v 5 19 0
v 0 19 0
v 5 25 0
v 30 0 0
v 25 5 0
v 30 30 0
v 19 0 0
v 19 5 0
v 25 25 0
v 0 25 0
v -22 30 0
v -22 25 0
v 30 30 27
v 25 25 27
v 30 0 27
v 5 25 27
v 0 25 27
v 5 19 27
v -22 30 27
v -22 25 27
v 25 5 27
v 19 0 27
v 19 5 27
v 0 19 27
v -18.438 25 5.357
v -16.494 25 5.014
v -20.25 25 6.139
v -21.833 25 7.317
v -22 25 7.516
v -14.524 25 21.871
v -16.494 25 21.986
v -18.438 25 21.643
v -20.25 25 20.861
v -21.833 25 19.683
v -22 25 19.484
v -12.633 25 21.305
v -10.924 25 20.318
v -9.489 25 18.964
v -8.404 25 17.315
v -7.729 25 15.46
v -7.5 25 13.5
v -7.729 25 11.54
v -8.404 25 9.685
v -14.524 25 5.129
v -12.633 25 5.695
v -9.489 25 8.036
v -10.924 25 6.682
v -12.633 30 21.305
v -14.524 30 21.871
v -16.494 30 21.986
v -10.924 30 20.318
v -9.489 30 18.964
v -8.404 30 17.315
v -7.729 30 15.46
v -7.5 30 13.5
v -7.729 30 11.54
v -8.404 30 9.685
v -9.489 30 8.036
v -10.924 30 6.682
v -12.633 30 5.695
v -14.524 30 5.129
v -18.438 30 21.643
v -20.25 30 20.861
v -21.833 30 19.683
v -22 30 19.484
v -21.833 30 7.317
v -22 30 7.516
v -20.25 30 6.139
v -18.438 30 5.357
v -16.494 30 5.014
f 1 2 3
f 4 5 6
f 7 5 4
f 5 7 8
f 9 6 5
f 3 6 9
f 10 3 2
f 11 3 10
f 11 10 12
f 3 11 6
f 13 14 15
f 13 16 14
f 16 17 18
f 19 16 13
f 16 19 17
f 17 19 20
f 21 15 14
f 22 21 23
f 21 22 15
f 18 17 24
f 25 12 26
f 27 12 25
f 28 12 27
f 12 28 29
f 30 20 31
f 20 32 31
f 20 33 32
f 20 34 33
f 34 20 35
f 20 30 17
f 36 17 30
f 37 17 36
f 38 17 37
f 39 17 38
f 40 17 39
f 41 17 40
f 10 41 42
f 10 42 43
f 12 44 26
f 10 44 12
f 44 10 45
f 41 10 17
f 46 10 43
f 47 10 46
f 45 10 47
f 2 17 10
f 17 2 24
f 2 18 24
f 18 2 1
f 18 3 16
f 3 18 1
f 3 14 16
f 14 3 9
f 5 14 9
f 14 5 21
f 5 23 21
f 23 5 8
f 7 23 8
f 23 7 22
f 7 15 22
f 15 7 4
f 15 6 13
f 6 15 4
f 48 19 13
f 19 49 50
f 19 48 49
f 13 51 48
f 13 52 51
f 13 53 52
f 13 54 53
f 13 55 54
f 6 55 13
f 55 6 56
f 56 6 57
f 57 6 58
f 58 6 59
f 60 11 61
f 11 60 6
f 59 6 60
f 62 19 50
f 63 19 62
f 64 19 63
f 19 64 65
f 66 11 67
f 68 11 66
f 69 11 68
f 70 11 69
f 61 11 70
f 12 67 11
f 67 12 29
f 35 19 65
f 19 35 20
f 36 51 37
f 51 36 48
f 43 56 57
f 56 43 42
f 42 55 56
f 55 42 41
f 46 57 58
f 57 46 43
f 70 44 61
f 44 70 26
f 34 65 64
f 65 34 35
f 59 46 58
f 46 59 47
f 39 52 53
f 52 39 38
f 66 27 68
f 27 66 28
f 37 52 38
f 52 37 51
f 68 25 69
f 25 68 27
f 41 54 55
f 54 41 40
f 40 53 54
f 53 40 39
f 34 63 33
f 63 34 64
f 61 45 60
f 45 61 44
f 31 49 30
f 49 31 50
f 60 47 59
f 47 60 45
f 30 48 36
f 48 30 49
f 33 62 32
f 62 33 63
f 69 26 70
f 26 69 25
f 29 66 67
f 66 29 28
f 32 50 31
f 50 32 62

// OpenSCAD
//diameter of the tool you want to use
tool_diameter = 17;
// type of the profile
profile_type = "2020 profile";//[2020 profile,custom]
// strength of the grabber
grabber_strength = 1;//[1:100]
// height of the plastic used in mm
plastic_tickness = 5;
/*[custom section]*/
// height of the profile in mm
height = 20;
// width of the profile in mm
width = 20;
/*[Hidden]*/
if (profile_type == "2020 profile") {
  difference() {
    linear_extrude( height=(tool_diameter + plastic_tickness * 2), twist=0, scale=[1, 1], center=false){
      union(){
        difference() {
          union(){
            difference() {
              square([(20 + plastic_tickness * 2), (20 + plastic_tickness * 2)], center=false);

              square([(20 + plastic_tickness * 1), (20 + plastic_tickness * 1)], center=false);
            }
            difference() {
              square([(20 + plastic_tickness), (20 + plastic_tickness)], center=false);

              translate([plastic_tickness, plastic_tickness, 0]){
                square([(20 - plastic_tickness * 1), (20 - plastic_tickness * 1)], center=false);
              }
              translate([(plastic_tickness * 1), (plastic_tickness * 1), 0]){
                square([(20 + plastic_tickness * 1), (20 + plastic_tickness * 1)], center=false);
              }
            }
          }

          translate([((grabber_strength / 1) * -1), ((grabber_strength + 0) * -1), 0]){
            square([20, 20], center=false);
          }
        }
        translate([((tool_diameter + plastic_tickness) * -1), (20 + plastic_tickness), 0]){
          square([(tool_diameter + plastic_tickness), plastic_tickness], center=false);
        }
      }
    }

    rotate([270, 0, 0]){
      translate([((tool_diameter / 2 + plastic_tickness * 1.5) * -1), ((tool_diameter / 2 + plastic_tickness) * -1), 0]){
        cylinder(r1=(tool_diameter / 2), r2=(tool_diameter / 2), h=1000, center=false);
      }
    }
  }
} else {
  difference() {
    linear_extrude( height=(tool_diameter + plastic_tickness * 2), twist=0, scale=[1, 1], center=false){
      union(){
        difference() {
          union(){
            difference() {
              square([(height + plastic_tickness * 2), (width + plastic_tickness * 2)], center=false);

              square([(height + plastic_tickness * 1), (width + plastic_tickness * 1)], center=false);
            }
            difference() {
              square([(height + plastic_tickness), (width + plastic_tickness)], center=false);

              translate([plastic_tickness, plastic_tickness, 0]){
                square([(height - plastic_tickness * 1), (width - plastic_tickness * 1)], center=false);
              }
              translate([(plastic_tickness * 1), (plastic_tickness * 1), 0]){
                square([(height + plastic_tickness * 1), (width + plastic_tickness * 1)], center=false);
              }
            }
          }

          translate([((grabber_strength / 1) * -1), ((grabber_strength + 0) * -1), 0]){
            square([height, width], center=false);
          }
        }
        translate([((tool_diameter + plastic_tickness) * -1), (width + plastic_tickness), 0]){
          square([(tool_diameter + plastic_tickness), plastic_tickness], center=false);
        }
      }
    }

    rotate([270, 0, 0]){
      translate([((tool_diameter / 2 + plastic_tickness * 1.5) * -1), ((tool_diameter / 2 + plastic_tickness) * -1), 0]){
        cylinder(r1=(tool_diameter / 2), r2=(tool_diameter / 2), h=1000, center=false);
      }
    }
  }
}

//20;

//20;
